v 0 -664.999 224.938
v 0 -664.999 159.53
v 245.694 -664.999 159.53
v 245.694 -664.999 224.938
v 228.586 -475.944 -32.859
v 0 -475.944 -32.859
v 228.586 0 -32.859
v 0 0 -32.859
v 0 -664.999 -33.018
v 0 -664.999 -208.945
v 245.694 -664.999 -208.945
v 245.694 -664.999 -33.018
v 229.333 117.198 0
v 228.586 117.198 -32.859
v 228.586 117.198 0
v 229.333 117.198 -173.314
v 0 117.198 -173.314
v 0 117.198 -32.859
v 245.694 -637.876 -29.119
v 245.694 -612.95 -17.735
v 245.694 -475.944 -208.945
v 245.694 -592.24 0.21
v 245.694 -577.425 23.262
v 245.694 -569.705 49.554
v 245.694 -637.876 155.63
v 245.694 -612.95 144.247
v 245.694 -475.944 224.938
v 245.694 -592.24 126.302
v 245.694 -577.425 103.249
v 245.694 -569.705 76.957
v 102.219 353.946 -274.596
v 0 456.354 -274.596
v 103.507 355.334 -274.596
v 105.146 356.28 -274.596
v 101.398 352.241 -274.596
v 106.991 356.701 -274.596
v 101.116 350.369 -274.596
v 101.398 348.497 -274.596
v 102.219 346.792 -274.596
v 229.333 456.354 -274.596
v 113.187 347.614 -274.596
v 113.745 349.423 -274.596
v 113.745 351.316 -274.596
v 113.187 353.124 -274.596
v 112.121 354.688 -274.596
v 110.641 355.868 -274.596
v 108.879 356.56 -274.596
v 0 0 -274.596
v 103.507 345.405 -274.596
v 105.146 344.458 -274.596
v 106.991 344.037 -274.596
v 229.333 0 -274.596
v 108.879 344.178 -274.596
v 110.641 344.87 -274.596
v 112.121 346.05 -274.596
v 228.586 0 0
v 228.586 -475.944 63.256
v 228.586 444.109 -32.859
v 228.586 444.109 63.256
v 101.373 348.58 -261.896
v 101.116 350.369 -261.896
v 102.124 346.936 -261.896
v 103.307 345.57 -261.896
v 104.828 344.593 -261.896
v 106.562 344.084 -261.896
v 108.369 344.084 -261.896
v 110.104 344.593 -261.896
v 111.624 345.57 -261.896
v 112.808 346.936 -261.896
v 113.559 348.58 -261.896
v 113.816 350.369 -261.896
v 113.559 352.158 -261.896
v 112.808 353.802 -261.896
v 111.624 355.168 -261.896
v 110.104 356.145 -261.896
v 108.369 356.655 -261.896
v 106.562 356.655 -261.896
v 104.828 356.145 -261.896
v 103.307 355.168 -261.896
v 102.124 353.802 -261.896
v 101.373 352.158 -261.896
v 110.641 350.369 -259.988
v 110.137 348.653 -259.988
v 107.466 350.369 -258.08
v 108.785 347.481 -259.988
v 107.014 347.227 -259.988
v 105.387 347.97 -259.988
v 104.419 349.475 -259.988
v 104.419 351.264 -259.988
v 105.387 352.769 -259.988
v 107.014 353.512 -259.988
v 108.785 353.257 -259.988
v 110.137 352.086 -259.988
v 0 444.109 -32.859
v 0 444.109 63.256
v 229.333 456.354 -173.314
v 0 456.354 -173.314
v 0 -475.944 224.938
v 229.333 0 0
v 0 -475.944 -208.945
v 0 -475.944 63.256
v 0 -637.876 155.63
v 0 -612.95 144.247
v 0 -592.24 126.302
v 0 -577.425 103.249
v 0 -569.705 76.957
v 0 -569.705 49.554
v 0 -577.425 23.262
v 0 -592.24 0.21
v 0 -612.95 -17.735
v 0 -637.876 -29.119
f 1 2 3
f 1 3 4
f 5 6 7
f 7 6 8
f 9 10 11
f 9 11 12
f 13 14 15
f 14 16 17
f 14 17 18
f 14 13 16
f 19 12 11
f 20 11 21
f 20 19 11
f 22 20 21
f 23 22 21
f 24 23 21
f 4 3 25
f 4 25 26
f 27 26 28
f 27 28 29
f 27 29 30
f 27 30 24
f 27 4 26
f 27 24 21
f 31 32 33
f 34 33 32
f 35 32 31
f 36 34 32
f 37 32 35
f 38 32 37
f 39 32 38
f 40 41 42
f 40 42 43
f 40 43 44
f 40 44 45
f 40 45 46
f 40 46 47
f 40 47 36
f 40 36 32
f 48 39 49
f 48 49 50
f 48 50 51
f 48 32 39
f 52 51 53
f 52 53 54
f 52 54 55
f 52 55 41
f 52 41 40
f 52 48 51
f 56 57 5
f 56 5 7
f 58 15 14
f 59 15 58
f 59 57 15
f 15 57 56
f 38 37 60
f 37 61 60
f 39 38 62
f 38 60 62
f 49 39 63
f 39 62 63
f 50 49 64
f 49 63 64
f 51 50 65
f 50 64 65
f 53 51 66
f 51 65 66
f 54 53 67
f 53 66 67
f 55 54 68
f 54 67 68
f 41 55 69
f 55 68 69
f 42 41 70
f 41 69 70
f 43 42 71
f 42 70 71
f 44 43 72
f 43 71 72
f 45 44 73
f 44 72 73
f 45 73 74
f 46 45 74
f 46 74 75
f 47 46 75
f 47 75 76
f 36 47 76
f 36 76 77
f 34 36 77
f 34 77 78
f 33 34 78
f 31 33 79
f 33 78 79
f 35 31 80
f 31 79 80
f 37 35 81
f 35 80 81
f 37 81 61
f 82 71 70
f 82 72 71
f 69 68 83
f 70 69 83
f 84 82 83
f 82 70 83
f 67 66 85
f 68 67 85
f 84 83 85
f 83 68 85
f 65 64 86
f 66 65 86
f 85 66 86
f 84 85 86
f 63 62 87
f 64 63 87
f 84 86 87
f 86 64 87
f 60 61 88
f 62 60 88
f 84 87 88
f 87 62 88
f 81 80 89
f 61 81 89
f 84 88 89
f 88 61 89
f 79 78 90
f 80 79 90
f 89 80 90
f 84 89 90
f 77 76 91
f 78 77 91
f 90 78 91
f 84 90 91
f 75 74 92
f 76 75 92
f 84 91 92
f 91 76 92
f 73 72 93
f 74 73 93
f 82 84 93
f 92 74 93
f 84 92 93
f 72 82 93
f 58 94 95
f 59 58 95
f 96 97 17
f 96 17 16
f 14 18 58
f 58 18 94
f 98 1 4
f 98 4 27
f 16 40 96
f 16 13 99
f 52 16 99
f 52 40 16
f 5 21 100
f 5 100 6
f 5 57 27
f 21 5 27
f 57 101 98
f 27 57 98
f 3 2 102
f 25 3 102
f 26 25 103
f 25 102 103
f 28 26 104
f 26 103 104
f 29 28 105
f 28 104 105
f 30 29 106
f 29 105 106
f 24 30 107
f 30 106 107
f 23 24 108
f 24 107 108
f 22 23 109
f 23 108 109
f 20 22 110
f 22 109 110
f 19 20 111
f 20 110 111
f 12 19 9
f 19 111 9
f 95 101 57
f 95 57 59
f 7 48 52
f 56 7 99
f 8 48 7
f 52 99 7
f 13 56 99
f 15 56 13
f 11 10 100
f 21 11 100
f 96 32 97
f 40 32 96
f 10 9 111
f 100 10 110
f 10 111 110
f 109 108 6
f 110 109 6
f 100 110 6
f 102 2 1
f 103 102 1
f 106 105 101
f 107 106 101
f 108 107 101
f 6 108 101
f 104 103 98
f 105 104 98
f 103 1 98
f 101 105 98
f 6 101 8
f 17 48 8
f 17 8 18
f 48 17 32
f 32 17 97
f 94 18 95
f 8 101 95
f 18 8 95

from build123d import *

# Parameters (mm, degrees)
F0_W      = 1114.6509647369
F0_H      = 96.1142629385
F1_DEPTH  = 228.5858858377
F2_W      = 117.198035121
F2_H      = 274.5957672596
F3_DEPTH  = 229.3333578855
F4_W      = 229.3333578855
F4_H      = 456.3540816307
F5_DEPTH  = 101.281305775
F6_W      = 189.0553534031
F6_H      = 433.8834732771
F7_DEPTH  = 245.6944454461
F8_R      = 96.273971764
F9_DEPTH  = 484.469877556
F11_D     = 12.7
F11_DEPTH = 12.7
F11_TIP   = 3.8154649308


with BuildPart() as f1:
    # F0 (on Right) → F1 (new body)
    with BuildSketch(Plane.YZ):
        with Locations((-113.2168769836, 15.1985660195)):
            Rectangle(F0_W, F0_H)
    extrude(amount=F1_DEPTH)

    # F2 (on Right) → F3 (join)
    with BuildSketch(Plane.YZ):
        with Locations((58.5990175605, -137.2978836298)):
            Rectangle(F2_W, F2_H)
    extrude(amount=F3_DEPTH)

    # F4 (on face) → F5 (join)
    with BuildSketch(Plane(origin=(0, 0, -274.5957672596), x_dir=(1, 0, 0), z_dir=(0, 0, -1))):
        with Locations((114.6666789427, -228.1770408154)):
            Rectangle(F4_W, F4_H)
    extrude(amount=-F5_DEPTH)

    # F6 (on Right) → F7 (join)
    with BuildSketch(Plane.YZ):
        with Locations((-570.4715698957, 7.9966709018)):
            Rectangle(F6_W, F6_H)
    extrude(amount=F7_DEPTH)

    # F8 (on face) → F9 (cut)
    with BuildSketch(Plane(origin=(0, 0, 0), x_dir=(0, -1, 0), z_dir=(-1, 0, 0))):
        with Locations((664.9992465973, 63.2556974888)):
            Circle(F8_R)
    extrude(amount=-F9_DEPTH, mode=Mode.SUBTRACT)

    # F11
    with Locations(Plane(origin=(0, 0, -274.5957672596), x_dir=(1, 0, 0), z_dir=(0, 0, -1))):
        with Locations((107.4657961726, -350.3691852093)):
            Hole(F11_D / 2, depth=F11_DEPTH)
            with Locations((0, 0, -(F11_DEPTH + F11_TIP / 2))):  # 118° drill point
                Cone(0, F11_D / 2, F11_TIP, mode=Mode.SUBTRACT)


solid = f1.part
